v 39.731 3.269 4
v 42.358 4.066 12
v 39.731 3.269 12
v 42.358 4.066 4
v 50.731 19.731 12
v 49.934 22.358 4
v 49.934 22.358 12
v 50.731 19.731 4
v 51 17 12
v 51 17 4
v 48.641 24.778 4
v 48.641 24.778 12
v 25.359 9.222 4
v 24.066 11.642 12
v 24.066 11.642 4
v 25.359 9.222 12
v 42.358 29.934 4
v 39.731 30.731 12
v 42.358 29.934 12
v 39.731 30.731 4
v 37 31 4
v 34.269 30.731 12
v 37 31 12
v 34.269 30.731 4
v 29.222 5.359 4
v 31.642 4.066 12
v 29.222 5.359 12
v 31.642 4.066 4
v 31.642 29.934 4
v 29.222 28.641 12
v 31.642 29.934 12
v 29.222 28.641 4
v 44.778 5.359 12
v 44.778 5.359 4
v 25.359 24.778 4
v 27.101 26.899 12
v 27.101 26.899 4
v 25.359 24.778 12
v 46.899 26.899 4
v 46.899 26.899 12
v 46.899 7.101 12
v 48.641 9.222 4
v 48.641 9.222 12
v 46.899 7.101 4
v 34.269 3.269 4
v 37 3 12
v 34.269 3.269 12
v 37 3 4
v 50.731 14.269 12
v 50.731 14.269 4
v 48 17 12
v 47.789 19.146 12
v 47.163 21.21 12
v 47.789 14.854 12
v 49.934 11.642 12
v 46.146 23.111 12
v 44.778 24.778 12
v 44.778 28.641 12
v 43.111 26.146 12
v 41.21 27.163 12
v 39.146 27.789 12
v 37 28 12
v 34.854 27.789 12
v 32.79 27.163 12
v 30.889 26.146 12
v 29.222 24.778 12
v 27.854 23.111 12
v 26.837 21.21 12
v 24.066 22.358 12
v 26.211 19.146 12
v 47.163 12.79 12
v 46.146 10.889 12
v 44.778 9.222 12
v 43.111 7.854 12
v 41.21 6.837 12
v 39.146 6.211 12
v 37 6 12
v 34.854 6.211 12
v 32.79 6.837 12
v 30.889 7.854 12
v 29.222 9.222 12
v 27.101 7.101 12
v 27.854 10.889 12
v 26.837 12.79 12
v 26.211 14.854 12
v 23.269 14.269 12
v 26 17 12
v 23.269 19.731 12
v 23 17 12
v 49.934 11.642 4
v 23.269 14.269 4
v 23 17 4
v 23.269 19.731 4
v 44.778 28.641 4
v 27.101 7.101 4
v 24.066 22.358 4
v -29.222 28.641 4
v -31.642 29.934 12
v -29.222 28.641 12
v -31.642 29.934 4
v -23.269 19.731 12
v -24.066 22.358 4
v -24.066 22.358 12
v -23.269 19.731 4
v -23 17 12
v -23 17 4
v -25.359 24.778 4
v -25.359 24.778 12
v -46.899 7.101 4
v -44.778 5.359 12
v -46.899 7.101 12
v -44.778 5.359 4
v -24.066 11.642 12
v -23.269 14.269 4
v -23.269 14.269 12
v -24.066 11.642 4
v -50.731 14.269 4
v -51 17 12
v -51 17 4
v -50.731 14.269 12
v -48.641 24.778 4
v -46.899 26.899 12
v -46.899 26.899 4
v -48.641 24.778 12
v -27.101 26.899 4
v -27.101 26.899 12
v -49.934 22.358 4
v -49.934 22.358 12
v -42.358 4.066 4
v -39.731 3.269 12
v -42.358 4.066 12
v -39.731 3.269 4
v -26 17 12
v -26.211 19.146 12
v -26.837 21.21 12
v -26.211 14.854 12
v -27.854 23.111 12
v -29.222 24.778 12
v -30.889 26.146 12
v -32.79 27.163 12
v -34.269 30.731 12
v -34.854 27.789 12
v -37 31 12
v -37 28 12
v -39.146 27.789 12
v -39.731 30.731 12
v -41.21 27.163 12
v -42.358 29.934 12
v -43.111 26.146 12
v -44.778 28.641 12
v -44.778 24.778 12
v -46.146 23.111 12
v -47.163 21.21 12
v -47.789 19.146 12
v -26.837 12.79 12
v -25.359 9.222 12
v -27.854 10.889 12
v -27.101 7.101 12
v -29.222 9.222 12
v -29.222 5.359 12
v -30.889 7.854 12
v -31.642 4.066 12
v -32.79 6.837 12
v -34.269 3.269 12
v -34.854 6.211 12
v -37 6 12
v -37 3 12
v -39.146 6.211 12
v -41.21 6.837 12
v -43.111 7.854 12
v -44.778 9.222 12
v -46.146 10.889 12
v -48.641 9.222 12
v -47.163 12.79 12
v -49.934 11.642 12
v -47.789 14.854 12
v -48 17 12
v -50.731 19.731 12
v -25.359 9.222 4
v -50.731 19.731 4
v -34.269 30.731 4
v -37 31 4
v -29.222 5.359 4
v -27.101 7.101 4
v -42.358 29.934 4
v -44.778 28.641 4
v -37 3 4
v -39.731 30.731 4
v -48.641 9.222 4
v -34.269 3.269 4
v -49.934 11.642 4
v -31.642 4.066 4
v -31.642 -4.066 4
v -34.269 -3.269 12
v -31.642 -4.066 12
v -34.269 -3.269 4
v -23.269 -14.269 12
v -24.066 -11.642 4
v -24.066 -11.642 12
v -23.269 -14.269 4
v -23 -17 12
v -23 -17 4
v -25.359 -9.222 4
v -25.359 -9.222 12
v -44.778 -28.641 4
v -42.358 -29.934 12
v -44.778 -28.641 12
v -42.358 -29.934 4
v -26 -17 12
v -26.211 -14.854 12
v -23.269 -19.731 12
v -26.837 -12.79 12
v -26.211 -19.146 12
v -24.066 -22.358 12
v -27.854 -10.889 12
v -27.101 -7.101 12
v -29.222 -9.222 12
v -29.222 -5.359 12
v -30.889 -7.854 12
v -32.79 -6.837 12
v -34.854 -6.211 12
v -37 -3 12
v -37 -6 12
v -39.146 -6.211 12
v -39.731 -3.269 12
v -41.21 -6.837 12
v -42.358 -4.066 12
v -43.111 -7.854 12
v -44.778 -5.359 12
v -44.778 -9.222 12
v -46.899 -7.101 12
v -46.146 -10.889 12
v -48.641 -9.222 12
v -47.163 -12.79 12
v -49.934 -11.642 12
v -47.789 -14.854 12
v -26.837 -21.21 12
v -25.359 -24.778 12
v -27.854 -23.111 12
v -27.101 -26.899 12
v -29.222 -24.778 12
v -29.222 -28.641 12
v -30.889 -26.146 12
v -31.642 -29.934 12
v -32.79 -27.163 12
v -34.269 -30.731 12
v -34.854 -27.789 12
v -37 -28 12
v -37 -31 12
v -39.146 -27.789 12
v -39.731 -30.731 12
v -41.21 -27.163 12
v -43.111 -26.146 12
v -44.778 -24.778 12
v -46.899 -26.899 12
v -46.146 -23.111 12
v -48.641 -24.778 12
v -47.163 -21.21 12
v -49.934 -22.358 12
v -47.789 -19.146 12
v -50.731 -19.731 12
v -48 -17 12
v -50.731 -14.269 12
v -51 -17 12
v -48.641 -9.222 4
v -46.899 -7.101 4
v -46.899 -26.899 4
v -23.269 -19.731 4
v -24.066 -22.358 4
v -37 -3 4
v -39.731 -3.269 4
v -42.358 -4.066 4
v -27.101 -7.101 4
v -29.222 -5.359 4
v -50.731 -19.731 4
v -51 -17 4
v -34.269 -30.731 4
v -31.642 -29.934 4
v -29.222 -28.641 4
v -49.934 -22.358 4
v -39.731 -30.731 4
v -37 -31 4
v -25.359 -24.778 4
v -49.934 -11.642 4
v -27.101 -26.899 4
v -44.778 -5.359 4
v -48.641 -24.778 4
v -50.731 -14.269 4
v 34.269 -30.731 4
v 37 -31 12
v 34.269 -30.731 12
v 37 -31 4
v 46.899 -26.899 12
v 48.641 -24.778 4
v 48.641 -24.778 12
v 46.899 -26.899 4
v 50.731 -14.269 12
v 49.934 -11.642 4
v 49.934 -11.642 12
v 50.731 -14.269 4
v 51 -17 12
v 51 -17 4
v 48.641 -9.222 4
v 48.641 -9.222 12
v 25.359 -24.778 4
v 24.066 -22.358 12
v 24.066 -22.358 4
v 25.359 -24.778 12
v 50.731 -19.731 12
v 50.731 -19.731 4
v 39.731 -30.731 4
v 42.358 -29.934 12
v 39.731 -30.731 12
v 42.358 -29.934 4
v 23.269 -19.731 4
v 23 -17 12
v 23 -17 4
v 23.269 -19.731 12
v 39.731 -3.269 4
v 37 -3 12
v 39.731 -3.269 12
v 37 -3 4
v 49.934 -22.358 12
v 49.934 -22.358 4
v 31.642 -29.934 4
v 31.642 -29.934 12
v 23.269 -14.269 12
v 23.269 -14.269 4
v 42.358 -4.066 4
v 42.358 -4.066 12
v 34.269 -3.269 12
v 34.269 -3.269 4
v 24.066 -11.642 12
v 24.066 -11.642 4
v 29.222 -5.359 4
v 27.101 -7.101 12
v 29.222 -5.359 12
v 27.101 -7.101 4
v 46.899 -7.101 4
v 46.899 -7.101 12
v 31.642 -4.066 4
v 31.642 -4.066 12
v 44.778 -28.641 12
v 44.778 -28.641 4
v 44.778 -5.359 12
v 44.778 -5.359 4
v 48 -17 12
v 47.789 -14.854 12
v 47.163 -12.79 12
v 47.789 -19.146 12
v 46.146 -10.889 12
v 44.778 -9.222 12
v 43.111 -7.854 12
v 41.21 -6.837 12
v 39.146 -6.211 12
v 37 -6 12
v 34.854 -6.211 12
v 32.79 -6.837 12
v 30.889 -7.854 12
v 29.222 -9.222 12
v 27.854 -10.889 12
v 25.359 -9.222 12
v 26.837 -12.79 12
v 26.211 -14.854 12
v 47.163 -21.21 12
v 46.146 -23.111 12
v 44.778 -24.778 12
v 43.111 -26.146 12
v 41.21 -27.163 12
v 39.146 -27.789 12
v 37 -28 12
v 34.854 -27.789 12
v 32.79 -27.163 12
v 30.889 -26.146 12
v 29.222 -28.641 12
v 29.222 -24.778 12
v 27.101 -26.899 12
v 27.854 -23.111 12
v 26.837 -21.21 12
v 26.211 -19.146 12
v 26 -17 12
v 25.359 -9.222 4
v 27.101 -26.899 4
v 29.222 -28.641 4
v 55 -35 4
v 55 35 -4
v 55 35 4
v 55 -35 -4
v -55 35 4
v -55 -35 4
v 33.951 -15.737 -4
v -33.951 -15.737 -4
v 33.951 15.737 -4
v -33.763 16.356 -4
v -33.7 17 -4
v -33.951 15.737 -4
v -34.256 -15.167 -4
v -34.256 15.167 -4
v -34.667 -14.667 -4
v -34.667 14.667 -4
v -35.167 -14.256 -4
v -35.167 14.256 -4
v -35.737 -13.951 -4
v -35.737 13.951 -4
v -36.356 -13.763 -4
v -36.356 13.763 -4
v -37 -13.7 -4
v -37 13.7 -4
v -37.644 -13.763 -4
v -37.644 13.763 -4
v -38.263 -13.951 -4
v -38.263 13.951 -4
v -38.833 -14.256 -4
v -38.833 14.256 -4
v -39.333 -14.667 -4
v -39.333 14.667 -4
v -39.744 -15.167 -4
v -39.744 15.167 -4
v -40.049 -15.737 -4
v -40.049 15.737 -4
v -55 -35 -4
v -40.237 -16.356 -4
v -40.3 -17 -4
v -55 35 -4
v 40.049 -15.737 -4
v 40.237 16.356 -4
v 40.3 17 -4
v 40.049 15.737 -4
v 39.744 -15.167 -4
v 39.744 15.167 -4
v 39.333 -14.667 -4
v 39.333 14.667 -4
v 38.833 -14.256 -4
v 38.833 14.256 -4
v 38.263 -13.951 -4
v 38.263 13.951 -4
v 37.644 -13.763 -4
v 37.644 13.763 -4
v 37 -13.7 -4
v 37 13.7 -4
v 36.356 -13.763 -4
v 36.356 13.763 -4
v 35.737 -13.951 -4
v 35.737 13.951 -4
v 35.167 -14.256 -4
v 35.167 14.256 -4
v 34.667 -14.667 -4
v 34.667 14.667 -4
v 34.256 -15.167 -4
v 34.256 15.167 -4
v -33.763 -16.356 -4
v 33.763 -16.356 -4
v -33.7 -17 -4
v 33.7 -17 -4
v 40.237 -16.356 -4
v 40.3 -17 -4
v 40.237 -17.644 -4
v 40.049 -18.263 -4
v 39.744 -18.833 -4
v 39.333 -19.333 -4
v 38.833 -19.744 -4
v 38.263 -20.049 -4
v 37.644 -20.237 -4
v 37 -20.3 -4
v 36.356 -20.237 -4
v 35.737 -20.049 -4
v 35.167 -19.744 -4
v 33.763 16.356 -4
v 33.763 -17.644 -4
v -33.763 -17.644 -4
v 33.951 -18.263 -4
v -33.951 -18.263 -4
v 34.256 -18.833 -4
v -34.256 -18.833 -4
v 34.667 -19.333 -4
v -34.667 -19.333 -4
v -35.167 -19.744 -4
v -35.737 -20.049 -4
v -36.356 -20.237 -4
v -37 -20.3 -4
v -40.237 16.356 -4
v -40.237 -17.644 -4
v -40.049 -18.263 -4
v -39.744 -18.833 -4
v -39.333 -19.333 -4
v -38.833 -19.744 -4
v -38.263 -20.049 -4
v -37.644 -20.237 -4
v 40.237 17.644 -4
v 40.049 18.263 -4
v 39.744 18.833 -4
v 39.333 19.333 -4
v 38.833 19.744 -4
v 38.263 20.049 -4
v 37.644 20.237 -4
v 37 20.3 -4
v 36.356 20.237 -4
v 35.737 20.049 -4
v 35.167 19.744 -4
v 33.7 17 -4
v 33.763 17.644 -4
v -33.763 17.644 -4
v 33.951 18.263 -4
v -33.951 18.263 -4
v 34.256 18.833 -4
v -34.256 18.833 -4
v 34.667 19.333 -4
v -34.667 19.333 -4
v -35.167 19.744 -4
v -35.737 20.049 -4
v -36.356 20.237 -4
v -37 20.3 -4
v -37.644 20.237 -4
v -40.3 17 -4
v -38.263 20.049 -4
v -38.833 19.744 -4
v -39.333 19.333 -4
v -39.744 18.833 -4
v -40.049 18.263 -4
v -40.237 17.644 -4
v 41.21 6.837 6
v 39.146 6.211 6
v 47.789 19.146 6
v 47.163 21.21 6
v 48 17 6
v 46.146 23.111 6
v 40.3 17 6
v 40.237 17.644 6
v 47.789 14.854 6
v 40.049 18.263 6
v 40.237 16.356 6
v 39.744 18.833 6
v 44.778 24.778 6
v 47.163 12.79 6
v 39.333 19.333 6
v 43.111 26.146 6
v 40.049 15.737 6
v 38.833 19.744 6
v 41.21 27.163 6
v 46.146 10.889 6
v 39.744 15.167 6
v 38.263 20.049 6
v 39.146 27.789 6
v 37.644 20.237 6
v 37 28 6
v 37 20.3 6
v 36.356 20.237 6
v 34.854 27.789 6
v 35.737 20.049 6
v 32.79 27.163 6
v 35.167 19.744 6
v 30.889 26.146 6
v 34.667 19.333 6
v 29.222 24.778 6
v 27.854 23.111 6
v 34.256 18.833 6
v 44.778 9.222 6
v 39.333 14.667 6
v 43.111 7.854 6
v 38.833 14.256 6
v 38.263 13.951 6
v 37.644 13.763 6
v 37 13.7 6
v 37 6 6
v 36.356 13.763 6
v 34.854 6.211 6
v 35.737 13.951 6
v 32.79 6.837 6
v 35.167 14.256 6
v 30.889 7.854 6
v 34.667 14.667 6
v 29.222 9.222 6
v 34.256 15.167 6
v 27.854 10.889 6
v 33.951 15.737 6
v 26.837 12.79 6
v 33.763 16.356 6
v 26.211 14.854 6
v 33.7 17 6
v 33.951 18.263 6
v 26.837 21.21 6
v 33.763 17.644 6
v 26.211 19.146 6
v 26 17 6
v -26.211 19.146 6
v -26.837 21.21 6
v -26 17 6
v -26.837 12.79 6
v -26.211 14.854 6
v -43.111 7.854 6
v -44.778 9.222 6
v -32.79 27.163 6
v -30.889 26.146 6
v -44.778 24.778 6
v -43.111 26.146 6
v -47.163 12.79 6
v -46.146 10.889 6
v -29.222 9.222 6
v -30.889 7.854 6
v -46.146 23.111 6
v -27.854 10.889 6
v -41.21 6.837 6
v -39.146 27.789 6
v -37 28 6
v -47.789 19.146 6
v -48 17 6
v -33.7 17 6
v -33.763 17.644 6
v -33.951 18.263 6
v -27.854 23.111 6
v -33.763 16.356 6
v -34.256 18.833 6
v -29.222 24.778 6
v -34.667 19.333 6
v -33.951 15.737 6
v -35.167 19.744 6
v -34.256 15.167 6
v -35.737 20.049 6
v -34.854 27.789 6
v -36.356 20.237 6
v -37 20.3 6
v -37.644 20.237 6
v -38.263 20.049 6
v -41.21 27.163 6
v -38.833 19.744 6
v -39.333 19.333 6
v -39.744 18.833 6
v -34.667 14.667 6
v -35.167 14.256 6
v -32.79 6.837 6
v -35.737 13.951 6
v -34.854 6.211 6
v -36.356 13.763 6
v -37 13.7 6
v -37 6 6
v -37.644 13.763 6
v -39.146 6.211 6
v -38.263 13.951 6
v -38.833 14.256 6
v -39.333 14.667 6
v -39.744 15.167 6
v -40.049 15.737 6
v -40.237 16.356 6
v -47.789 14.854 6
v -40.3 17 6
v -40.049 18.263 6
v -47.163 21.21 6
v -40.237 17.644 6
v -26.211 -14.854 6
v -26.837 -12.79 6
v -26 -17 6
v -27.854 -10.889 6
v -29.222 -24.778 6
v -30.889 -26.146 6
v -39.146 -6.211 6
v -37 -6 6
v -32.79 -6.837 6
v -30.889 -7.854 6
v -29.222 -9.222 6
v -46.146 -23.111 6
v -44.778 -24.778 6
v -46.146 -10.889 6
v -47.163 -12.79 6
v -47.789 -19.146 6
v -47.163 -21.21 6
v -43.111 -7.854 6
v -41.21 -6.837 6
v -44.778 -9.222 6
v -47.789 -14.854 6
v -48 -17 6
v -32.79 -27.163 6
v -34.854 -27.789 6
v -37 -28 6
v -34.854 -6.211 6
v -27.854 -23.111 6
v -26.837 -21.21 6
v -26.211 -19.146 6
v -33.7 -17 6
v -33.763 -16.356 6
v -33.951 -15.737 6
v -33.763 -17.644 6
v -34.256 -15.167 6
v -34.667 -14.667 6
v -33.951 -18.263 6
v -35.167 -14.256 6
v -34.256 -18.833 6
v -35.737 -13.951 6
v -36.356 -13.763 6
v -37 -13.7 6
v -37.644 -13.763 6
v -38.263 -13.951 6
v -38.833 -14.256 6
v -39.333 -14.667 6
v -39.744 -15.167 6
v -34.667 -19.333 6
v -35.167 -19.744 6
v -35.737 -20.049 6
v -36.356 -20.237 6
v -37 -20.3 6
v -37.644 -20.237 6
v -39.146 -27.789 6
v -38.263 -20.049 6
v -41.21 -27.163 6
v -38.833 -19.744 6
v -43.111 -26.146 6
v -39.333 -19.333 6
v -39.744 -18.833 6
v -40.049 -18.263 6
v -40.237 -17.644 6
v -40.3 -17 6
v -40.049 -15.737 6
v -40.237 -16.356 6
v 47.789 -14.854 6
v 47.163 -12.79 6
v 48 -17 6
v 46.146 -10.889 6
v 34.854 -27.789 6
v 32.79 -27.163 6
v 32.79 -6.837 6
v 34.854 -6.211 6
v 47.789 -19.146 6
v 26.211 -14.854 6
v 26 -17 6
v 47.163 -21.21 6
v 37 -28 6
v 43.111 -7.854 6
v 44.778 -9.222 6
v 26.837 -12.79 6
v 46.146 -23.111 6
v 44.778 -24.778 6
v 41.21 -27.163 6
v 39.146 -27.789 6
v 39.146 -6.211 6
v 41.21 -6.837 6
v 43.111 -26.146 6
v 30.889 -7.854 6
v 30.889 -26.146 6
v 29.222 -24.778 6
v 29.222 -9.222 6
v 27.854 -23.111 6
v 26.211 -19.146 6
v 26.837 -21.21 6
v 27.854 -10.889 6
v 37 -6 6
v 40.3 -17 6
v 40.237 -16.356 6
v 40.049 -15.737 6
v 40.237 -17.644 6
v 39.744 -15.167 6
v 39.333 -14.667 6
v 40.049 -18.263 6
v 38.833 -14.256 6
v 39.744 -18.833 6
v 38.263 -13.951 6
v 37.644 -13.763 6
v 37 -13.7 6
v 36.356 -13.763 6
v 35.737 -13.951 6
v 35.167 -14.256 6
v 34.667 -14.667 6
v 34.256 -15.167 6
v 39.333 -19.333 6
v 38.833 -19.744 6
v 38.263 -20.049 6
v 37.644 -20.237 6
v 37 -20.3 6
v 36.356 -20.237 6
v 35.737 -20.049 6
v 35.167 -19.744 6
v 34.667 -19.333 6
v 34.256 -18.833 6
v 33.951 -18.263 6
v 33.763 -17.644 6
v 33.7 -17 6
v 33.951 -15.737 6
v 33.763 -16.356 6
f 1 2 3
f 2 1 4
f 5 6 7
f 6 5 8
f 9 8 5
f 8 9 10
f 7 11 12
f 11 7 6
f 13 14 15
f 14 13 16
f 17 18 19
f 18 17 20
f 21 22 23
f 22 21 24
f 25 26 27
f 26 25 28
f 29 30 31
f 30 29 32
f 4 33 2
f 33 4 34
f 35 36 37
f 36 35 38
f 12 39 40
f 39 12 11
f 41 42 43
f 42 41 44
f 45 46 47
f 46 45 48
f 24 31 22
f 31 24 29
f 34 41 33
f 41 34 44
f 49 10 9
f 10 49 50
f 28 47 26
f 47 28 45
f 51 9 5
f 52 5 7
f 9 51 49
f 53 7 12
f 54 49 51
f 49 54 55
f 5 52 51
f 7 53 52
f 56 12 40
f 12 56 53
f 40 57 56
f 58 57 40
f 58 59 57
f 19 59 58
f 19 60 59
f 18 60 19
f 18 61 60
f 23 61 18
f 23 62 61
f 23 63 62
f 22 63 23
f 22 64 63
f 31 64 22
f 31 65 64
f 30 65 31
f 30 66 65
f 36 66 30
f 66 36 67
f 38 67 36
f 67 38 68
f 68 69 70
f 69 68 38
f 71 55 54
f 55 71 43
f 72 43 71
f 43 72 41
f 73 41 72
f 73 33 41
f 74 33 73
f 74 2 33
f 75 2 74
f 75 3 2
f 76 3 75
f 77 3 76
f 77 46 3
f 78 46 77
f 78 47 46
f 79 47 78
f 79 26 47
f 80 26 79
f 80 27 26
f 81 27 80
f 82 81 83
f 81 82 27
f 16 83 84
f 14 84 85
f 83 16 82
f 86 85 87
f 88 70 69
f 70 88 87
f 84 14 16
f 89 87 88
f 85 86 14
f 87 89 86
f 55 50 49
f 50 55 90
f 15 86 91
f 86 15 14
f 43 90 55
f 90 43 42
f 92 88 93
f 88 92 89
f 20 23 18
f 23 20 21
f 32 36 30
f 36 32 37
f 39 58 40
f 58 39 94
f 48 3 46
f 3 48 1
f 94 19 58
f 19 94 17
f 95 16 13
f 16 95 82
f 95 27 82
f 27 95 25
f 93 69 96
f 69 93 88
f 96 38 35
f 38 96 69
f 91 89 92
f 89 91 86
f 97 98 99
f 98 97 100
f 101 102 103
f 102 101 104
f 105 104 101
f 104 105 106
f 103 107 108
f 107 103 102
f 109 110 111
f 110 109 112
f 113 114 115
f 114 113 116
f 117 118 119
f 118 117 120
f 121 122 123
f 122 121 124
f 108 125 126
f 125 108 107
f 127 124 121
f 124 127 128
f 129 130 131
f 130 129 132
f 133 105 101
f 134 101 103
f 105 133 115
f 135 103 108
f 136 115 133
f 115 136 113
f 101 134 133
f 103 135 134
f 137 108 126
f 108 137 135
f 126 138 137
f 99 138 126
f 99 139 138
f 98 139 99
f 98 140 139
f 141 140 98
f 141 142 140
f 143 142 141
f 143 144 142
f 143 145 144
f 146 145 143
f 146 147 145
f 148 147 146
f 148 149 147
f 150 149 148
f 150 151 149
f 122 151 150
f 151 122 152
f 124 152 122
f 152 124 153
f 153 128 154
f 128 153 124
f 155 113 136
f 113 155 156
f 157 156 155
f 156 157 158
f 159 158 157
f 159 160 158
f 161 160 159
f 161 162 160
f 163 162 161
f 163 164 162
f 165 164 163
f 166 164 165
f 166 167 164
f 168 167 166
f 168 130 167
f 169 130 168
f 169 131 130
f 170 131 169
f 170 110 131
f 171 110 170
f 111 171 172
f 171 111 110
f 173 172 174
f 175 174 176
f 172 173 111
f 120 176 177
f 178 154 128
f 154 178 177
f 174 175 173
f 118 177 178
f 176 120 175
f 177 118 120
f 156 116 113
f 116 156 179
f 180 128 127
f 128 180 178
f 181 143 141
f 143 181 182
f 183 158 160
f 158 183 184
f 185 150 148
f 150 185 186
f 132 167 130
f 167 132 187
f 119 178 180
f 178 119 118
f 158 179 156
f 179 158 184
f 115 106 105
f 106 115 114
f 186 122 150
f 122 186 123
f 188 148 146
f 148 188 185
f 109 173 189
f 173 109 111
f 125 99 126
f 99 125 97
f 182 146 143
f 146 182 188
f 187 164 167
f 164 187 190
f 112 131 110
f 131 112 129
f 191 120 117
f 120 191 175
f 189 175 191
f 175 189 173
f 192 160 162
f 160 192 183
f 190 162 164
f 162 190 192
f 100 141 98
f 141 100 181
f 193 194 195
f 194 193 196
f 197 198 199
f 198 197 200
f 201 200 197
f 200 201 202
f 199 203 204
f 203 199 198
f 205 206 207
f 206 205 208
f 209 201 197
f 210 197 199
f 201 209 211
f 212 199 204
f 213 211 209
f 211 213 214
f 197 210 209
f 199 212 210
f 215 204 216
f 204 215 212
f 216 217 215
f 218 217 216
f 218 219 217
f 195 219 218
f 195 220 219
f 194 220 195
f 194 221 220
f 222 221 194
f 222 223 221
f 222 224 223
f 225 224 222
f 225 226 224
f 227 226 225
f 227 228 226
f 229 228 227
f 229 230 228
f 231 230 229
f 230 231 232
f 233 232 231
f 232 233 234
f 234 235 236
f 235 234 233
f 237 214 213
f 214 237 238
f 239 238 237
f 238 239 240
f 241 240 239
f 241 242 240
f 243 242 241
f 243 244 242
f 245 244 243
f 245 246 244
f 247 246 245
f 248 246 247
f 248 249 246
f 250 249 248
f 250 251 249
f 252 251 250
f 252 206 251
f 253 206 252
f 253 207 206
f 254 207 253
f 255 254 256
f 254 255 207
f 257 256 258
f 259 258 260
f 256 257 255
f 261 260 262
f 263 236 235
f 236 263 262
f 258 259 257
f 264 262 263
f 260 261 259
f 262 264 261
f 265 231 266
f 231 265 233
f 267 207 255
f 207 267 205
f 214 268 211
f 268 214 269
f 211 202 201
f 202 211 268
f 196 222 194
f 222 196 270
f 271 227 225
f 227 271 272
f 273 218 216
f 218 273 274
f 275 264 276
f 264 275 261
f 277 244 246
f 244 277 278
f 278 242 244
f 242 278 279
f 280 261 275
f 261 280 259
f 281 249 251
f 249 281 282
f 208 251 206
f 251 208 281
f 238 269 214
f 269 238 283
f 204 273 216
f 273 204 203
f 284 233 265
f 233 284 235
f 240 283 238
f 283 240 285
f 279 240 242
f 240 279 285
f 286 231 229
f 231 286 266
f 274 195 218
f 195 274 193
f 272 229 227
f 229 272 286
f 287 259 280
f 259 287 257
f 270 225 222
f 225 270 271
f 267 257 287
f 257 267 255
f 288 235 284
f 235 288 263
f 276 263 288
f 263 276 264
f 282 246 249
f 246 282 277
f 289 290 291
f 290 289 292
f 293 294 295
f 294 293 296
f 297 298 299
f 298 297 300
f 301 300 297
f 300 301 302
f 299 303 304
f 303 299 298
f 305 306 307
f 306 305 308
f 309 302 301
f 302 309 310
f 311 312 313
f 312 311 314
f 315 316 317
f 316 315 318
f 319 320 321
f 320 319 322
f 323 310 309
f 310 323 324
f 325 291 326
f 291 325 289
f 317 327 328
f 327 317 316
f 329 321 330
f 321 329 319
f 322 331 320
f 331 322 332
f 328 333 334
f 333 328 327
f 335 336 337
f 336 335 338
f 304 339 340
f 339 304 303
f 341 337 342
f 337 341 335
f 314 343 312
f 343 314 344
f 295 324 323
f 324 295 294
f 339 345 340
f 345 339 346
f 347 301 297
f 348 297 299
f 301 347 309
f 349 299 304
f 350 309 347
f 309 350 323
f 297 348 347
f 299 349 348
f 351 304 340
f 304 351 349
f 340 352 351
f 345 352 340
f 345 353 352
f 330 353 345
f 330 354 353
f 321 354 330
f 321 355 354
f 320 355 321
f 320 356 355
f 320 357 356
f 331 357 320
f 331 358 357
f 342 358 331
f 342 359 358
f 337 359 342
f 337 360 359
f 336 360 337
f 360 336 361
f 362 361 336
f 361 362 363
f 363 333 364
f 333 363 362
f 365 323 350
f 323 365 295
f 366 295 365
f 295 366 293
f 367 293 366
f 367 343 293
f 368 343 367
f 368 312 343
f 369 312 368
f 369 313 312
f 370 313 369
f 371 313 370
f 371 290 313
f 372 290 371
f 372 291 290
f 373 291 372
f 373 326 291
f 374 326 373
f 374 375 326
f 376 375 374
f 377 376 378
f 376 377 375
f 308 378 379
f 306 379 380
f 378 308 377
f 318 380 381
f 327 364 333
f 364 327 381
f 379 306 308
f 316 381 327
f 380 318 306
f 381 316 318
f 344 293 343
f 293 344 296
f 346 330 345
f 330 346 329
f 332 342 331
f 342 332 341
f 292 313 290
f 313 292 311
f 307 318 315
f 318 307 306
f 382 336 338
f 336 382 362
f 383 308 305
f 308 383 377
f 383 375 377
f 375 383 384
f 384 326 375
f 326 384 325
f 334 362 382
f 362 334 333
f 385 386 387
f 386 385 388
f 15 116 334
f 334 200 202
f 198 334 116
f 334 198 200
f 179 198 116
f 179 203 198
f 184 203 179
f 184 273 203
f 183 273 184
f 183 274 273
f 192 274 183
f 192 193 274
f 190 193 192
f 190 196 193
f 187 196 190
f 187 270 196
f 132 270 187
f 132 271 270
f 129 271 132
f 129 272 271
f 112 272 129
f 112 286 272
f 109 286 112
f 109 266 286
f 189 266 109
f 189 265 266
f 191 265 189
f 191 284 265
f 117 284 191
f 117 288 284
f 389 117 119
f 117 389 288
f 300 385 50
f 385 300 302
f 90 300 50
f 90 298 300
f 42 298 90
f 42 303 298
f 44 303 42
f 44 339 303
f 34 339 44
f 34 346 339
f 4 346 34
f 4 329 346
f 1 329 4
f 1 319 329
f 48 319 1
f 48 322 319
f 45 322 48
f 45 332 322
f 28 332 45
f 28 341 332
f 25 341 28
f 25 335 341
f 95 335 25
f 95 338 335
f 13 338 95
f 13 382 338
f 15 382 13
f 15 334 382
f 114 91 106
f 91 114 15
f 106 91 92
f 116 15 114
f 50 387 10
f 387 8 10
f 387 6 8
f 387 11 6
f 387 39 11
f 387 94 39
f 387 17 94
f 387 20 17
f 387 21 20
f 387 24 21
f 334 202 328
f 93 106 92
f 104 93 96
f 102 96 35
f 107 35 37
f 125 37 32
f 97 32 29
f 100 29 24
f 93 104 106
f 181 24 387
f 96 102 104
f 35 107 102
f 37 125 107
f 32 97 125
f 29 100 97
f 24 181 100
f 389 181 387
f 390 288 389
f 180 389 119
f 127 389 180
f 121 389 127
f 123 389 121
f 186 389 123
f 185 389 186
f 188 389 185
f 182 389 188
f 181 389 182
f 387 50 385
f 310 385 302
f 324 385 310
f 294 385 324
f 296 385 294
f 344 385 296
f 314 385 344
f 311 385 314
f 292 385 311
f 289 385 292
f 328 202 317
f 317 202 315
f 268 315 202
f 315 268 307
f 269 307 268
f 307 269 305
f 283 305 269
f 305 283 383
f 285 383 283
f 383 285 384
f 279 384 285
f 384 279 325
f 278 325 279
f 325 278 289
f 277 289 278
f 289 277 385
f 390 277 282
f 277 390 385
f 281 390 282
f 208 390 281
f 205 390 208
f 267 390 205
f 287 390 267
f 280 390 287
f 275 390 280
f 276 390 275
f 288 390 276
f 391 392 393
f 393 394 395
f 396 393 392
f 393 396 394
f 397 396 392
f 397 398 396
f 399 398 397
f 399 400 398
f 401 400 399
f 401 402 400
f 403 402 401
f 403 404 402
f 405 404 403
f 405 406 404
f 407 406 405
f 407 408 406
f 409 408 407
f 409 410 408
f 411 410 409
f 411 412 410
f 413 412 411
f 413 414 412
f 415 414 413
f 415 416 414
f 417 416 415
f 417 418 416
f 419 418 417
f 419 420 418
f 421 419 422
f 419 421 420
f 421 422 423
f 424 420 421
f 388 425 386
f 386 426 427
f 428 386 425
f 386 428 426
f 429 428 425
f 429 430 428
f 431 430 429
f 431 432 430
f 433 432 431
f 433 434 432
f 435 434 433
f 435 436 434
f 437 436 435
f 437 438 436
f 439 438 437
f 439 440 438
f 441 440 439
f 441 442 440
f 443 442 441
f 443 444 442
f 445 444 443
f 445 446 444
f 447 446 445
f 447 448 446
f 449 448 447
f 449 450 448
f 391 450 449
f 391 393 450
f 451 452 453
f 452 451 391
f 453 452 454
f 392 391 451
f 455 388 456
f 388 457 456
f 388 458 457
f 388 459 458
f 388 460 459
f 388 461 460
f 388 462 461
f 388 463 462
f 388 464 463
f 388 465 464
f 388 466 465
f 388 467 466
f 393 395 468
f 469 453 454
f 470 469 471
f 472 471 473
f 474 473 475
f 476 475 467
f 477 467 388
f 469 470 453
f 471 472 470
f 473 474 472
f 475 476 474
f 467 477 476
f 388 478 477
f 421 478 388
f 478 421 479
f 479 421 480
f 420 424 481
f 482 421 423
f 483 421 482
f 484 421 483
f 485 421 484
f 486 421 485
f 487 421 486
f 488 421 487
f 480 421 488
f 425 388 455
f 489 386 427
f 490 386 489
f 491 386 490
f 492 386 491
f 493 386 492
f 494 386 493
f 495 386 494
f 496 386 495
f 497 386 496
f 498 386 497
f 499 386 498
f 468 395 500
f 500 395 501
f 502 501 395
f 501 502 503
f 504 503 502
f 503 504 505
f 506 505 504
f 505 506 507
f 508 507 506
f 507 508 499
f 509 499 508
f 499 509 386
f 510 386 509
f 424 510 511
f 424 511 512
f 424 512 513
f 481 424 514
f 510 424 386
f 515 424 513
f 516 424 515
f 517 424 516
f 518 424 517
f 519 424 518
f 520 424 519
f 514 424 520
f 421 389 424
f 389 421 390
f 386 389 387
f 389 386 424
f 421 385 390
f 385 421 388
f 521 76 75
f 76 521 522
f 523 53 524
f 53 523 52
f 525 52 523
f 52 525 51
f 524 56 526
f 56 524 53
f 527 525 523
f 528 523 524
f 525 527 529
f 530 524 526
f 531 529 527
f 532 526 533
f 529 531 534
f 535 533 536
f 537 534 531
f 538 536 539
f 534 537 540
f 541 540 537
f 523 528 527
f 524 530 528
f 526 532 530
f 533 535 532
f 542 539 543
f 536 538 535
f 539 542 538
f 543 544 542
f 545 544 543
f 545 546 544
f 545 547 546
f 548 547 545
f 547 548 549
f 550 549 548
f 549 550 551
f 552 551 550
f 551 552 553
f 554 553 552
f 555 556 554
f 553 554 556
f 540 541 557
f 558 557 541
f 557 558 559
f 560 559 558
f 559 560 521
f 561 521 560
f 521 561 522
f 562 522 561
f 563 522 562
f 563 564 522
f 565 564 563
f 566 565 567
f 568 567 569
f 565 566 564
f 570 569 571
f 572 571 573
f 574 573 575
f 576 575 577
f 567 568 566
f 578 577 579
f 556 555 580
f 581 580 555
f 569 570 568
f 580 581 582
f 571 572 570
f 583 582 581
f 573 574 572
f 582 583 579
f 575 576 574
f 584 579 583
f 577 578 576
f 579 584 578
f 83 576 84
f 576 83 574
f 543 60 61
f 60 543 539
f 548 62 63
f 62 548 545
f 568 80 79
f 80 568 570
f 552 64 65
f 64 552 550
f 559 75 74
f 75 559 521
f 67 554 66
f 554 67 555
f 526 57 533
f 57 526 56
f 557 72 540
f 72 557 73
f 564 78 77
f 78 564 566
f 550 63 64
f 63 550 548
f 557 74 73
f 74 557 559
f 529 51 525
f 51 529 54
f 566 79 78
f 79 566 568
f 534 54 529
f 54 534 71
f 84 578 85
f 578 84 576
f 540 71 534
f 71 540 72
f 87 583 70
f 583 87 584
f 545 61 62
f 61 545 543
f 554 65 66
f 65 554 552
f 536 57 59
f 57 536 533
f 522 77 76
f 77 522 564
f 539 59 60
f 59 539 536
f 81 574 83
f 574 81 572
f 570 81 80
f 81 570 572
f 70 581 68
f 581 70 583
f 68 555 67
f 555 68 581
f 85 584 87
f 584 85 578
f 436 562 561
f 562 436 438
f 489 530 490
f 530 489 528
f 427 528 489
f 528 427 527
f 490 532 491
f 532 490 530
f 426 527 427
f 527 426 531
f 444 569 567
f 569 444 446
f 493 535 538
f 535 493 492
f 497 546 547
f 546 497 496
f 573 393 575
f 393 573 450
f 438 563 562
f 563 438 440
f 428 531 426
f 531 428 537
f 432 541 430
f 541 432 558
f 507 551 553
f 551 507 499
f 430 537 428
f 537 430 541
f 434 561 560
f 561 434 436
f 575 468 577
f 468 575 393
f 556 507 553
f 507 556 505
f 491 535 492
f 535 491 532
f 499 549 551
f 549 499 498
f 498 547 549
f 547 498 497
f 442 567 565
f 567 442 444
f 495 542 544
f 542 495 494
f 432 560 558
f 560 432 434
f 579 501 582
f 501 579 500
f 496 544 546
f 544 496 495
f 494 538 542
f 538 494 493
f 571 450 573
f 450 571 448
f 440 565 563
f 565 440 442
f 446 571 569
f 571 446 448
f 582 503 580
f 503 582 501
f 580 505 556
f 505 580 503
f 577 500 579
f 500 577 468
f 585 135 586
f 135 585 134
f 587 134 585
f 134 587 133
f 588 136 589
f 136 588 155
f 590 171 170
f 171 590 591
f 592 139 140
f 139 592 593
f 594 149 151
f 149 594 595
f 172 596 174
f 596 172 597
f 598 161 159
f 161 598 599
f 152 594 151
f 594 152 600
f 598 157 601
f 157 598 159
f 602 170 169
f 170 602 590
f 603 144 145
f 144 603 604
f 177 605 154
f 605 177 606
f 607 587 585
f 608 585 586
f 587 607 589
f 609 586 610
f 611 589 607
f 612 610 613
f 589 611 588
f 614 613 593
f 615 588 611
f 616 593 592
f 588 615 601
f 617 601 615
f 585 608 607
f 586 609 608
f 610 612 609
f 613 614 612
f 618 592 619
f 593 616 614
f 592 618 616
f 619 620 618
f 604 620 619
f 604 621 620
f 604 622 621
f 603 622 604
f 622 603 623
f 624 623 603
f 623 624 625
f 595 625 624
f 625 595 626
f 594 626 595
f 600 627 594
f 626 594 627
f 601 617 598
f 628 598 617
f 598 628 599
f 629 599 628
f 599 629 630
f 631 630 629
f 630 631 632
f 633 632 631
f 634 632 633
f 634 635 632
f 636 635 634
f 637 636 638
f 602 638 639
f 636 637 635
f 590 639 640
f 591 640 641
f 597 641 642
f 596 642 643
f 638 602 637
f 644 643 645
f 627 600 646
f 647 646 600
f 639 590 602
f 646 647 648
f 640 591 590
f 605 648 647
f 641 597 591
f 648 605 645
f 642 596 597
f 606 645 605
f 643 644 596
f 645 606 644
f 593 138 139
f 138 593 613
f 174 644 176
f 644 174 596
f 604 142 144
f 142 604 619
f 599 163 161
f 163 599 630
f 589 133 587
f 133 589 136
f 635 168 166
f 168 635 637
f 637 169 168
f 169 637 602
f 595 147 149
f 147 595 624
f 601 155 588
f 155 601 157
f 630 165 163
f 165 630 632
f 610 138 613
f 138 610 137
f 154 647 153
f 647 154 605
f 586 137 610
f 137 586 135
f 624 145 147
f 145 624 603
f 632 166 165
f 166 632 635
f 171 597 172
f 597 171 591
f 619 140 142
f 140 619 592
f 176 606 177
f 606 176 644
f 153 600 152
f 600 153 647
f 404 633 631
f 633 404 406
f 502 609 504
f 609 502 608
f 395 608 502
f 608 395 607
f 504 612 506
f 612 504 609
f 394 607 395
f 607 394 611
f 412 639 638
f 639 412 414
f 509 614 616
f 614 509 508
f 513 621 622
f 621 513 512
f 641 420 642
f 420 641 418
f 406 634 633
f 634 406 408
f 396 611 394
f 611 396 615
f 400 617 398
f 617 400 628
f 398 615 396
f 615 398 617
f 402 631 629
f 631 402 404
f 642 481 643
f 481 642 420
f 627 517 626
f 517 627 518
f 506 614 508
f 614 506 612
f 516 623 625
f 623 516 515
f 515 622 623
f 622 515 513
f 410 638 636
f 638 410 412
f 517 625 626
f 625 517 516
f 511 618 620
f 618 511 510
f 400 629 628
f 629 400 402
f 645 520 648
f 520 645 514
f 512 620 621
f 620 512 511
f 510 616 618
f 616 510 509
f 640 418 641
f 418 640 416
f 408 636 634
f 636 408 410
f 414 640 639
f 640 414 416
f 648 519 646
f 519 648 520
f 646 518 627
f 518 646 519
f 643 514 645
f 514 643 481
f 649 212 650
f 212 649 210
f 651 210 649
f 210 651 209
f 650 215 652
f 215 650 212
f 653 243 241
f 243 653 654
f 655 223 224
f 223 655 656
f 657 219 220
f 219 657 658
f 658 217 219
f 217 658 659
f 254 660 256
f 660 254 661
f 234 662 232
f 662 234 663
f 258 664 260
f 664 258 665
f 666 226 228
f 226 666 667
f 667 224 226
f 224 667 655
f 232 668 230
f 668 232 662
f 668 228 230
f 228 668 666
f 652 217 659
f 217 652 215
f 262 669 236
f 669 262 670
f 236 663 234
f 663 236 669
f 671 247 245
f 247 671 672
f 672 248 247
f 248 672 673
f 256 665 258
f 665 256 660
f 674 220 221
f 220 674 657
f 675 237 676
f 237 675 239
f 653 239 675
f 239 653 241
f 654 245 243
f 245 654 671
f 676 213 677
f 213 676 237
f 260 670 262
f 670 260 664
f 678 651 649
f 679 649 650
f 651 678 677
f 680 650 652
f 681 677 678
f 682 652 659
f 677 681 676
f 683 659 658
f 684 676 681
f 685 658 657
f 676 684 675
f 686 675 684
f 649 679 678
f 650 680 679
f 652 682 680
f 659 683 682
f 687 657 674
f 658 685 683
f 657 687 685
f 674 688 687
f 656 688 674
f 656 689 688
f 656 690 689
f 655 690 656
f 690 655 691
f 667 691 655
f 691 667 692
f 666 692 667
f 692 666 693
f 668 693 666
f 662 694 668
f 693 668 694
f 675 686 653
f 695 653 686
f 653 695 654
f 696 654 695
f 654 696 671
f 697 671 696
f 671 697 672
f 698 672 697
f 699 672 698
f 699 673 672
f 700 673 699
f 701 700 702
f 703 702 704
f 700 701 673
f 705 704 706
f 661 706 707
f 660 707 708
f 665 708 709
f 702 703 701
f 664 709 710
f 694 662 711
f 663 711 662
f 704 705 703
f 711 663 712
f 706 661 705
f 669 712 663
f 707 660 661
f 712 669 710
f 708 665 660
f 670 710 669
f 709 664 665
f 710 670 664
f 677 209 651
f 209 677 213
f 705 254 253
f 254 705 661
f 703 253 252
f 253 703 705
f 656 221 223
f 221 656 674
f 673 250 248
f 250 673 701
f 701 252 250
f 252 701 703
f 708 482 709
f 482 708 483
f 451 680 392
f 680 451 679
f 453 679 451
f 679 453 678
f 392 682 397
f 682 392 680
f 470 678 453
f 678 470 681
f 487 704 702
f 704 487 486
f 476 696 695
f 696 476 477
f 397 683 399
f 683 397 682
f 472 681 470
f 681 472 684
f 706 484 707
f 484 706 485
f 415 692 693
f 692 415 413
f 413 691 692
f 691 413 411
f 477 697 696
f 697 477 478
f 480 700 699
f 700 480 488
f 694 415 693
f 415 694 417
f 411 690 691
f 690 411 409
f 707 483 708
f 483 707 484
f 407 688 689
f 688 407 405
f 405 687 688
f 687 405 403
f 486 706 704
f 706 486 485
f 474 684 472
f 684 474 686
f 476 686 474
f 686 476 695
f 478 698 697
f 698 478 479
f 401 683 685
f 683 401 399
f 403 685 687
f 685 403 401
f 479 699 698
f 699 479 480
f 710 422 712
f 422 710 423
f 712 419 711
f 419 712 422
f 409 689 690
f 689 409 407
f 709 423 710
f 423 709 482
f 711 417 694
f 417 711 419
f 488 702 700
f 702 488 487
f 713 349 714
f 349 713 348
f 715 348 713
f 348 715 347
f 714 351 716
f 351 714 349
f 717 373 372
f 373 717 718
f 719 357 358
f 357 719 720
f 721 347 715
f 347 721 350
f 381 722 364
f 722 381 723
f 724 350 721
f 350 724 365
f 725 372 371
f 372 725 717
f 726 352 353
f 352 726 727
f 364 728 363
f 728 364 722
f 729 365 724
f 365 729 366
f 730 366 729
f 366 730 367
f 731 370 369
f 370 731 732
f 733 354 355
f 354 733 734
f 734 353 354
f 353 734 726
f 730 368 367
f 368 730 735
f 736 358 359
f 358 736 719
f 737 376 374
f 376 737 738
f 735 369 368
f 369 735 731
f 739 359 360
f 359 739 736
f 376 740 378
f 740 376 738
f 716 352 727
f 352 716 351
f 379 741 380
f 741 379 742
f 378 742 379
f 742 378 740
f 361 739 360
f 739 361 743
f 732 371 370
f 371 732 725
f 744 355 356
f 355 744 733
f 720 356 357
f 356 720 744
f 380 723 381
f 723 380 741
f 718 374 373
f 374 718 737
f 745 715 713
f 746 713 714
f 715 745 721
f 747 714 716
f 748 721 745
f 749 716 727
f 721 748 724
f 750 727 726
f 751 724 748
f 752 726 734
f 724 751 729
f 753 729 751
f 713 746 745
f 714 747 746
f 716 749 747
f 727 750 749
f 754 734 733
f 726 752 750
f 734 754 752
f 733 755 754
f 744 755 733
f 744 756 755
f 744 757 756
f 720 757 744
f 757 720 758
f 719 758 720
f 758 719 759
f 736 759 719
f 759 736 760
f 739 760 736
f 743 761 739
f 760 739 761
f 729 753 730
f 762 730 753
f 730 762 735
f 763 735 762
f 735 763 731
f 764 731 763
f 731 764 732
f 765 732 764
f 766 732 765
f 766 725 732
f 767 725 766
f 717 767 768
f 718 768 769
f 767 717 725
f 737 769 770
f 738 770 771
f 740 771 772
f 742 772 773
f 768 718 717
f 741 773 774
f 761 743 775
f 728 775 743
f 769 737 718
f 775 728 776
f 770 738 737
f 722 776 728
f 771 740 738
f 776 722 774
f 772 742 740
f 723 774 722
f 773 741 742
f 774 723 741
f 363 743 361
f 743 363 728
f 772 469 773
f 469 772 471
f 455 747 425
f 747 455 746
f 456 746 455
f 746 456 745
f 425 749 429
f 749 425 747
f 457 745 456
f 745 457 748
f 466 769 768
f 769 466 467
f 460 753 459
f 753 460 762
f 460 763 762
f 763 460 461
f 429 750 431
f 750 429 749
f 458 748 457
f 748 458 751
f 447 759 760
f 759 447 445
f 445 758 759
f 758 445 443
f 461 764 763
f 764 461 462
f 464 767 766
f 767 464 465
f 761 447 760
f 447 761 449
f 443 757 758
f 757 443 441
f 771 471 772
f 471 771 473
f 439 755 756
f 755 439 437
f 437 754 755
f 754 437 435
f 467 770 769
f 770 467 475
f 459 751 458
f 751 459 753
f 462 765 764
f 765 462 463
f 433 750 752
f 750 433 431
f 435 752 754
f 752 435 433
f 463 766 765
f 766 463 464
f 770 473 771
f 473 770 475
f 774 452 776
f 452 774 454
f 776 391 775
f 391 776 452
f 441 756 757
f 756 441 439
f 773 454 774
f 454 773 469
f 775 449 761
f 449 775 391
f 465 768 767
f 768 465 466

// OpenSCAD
$fn = 32;

// ----------------------------------------------------------------------
// Socket pad plate
// bosses with counterbored sockets for the screws
// ----------------------------------------------------------------------

// --- parameters (mm) ---
base_t = 8;            // base plate thickness
boss_h = 8;            // boss height above the base plate
boss_d = 28;           // boss diameter
socket_d = 22;         // socket diameter
socket_depth = 6;      // socket depth from the boss face
bolt_d = 6.6;          // screw clearance hole through the socket floor
plate = [110, 70, 8];  // overall size (x, y, z)
edge = 18;             // boss centre offset from the plate edge
pads = 4;              // boss count, one per corner

// --- derived feature positions (mm) ---
height = base_t + boss_h;        // = 16   overall height of the part
corner_x = plate[0] / 2 - edge;  // = 37   boss centre X
corner_y = plate[1] / 2 - edge;  // = 17   boss centre Y
feature_centers = [
  [corner_x, corner_y],
  [-corner_x, corner_y],
  [-corner_x, -corner_y],
  [corner_x, -corner_y]
];   // boss centres: sockets, holes and the pads themselves are placed from here

// base plate, bosses on feature_centers, socket + through hole in each
difference() {
  union() {
    cube(plate, center = true);
    for (centre = feature_centers)
      translate([centre[0], centre[1], plate[2] / 2 - 1])
        cylinder(d = boss_d, h = boss_h + 1);
  }
  for (centre = feature_centers) {
    translate([centre[0], centre[1], plate[2] / 2 + boss_h - socket_depth])
      cylinder(d = socket_d, h = socket_depth + 1);
    translate([centre[0], centre[1], -height])
      cylinder(d = bolt_d, h = 2 * height + 2);  // through the socket floor
  }
}
